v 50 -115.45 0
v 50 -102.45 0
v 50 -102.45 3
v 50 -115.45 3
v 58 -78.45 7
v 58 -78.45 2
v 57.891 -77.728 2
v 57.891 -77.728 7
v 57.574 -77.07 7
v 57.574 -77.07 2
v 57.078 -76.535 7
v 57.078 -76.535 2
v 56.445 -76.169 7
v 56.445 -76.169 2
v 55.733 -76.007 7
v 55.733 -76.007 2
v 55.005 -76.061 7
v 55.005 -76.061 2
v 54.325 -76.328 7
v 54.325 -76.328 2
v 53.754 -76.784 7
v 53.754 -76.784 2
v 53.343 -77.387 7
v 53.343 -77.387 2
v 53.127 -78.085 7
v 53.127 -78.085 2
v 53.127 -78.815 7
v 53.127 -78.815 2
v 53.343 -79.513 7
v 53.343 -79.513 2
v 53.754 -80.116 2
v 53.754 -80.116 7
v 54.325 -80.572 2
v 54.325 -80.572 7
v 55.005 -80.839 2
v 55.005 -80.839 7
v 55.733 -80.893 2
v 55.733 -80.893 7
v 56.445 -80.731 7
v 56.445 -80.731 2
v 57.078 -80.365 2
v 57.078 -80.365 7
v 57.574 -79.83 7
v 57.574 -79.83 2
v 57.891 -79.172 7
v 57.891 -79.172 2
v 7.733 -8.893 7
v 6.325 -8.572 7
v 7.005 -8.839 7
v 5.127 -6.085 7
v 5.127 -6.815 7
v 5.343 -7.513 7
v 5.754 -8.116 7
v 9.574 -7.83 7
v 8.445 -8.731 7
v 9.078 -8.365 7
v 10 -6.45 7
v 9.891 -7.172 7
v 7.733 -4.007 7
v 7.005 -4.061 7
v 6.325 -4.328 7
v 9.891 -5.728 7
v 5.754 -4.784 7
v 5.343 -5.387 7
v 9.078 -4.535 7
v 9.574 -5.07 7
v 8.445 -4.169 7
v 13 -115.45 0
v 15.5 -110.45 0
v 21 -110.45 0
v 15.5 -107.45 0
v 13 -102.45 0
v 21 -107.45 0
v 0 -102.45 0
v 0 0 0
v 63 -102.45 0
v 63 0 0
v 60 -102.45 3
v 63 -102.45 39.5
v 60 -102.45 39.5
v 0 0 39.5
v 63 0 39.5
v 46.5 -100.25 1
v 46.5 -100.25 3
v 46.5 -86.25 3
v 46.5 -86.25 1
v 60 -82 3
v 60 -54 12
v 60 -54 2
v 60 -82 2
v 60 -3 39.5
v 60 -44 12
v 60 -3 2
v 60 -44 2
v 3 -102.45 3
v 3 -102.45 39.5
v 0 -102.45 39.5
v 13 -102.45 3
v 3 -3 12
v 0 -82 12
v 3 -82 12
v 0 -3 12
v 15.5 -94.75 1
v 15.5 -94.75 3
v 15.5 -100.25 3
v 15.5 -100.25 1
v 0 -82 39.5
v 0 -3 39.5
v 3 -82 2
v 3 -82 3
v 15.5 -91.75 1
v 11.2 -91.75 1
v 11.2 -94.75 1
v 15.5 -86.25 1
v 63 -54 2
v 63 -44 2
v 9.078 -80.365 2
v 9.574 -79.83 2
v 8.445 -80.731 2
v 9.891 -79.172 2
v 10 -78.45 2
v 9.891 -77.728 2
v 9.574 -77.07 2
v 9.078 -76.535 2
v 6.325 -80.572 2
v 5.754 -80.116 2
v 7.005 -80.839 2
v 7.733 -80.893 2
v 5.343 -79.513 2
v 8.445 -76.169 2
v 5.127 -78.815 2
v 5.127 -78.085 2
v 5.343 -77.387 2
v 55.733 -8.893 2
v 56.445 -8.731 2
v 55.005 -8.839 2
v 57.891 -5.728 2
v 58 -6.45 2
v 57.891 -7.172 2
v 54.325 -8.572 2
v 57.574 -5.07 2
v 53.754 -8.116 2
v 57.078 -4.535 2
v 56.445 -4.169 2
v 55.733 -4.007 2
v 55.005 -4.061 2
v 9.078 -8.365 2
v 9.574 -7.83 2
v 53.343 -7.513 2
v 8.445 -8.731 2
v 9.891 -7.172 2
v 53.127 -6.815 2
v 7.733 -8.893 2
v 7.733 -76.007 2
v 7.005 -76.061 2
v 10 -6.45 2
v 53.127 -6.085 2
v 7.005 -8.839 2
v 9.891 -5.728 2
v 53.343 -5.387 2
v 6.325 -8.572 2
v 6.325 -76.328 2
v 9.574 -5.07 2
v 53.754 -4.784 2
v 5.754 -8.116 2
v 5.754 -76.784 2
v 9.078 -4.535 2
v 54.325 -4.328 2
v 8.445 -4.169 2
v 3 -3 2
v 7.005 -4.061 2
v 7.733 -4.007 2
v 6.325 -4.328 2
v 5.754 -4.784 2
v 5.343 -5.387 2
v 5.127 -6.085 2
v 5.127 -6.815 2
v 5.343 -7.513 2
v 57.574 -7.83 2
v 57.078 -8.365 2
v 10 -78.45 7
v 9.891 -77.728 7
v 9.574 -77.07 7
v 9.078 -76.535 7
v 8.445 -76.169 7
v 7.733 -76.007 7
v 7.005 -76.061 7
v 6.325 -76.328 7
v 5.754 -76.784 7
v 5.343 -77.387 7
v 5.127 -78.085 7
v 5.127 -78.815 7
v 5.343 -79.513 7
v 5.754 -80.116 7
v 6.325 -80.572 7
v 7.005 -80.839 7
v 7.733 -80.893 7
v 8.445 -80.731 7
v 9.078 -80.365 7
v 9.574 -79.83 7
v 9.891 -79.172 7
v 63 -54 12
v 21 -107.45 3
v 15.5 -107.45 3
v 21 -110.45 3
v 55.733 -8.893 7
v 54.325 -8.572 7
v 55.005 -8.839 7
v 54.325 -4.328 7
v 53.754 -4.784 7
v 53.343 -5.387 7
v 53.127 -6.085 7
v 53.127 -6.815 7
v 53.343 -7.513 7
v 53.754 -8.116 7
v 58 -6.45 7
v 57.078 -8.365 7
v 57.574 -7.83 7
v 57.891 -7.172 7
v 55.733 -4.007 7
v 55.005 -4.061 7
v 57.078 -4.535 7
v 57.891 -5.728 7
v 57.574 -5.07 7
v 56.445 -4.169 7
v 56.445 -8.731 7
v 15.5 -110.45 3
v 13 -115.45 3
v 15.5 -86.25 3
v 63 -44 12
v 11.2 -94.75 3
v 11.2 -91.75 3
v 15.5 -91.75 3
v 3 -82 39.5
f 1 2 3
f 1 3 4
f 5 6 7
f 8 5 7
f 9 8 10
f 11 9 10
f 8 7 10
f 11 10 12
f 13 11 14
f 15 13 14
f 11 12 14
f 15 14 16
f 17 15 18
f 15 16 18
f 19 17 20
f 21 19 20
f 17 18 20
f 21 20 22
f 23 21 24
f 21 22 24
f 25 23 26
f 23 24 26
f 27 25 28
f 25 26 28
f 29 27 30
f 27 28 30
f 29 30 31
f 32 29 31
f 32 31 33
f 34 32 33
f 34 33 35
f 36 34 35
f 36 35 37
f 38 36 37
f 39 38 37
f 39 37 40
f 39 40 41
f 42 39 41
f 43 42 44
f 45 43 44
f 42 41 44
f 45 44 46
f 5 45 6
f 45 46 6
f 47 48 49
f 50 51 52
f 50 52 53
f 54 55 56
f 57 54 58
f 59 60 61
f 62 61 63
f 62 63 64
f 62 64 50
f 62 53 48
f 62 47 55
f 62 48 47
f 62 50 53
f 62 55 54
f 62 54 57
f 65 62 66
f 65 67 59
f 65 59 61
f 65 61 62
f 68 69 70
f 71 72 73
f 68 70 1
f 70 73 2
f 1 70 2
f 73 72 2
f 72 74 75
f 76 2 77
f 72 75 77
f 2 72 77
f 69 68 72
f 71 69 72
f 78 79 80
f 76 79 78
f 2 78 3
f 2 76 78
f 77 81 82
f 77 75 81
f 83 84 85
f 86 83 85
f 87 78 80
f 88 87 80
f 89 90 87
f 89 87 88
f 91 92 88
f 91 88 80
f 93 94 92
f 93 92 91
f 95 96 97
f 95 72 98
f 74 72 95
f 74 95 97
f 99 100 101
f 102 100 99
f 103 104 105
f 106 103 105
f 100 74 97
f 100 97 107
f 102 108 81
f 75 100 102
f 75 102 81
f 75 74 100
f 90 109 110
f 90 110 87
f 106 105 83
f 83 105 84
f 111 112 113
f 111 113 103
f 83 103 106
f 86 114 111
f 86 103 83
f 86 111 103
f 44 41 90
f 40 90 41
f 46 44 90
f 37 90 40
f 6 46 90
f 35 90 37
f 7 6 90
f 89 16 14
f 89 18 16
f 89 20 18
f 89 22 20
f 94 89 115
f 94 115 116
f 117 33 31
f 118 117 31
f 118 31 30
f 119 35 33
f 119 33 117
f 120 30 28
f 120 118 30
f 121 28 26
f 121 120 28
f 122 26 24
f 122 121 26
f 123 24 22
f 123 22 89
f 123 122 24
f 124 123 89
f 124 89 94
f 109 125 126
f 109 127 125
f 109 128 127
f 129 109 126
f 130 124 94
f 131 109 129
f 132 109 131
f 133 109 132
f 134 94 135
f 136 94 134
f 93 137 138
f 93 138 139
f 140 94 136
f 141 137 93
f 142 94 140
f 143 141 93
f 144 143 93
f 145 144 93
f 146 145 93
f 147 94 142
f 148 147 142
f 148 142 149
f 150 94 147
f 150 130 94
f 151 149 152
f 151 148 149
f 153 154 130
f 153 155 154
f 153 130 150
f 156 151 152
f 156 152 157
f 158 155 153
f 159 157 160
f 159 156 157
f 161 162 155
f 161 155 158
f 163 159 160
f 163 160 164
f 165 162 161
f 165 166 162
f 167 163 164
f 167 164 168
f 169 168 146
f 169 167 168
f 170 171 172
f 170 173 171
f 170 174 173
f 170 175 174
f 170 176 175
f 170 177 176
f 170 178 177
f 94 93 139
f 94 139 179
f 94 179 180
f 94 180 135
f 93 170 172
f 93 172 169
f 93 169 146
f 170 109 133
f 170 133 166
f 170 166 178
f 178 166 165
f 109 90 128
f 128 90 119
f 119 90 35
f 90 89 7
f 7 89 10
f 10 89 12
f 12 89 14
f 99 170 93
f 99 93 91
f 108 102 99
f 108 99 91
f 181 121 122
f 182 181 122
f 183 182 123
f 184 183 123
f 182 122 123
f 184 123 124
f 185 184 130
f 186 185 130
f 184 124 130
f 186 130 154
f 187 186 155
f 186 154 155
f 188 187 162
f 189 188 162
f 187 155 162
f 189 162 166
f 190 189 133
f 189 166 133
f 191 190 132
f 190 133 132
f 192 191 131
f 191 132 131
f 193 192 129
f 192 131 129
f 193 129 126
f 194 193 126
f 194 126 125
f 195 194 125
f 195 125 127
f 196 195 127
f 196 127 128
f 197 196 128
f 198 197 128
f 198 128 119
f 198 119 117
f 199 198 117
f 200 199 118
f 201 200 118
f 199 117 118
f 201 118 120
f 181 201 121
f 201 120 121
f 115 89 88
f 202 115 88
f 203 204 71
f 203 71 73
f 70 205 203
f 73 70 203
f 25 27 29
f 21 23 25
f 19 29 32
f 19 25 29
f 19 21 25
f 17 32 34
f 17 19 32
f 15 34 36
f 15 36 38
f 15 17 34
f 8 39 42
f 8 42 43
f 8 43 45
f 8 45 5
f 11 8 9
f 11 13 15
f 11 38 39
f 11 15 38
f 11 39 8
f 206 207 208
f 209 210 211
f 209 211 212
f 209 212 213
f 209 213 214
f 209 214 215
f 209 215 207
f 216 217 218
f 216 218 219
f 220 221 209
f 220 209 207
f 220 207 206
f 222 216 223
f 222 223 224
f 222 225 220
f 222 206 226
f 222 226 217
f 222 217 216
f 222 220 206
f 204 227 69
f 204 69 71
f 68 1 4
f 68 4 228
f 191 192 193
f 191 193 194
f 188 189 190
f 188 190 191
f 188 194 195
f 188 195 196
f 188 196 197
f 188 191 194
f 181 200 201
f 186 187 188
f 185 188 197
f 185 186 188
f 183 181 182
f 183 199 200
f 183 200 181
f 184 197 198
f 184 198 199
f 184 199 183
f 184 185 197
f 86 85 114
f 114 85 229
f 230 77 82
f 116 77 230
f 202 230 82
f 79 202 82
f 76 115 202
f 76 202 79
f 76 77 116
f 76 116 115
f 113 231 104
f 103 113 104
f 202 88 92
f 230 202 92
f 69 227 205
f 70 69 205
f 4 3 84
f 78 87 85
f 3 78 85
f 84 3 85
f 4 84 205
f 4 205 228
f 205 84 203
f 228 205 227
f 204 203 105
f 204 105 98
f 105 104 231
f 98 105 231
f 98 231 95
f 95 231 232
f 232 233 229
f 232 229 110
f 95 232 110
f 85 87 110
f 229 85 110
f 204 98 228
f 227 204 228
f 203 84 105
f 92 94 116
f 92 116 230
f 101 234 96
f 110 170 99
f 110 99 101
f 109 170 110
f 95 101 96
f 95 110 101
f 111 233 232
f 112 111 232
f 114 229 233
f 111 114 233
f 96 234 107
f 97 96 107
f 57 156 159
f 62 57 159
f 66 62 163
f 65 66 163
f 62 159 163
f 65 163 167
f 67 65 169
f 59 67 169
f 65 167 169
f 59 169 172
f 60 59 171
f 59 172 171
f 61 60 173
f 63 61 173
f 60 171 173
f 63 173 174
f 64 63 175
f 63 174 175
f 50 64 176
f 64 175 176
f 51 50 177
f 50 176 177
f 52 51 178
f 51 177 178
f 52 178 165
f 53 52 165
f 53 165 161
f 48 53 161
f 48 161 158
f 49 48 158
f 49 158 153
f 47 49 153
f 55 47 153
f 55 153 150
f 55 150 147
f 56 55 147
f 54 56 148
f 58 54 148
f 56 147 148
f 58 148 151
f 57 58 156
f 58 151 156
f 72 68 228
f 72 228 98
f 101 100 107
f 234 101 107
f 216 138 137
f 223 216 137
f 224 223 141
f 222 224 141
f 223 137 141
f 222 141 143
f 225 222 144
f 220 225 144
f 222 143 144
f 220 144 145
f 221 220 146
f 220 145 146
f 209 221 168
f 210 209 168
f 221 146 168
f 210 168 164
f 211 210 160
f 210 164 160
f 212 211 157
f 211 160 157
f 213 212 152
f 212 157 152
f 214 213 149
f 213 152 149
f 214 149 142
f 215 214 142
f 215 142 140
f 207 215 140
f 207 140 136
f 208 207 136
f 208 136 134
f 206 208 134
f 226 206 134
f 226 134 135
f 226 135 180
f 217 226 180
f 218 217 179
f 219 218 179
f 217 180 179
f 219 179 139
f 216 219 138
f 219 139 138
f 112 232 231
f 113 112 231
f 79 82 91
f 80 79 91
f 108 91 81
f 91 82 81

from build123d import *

# Parameters (mm, degrees)
P_IDAT_VYSUNUT_M1_DEPTH  = 2
SKICA3_R                 = 2.45
P_IDAT_VYSUNUT_M3_DEPTH  = 5
P_IDAT_VYSUNUT_M4_DEPTH  = 37.5
SKICA8_W                 = 10
SKICA8_H                 = 10
ODEBRAT_VYSUNUT_M2_DEPTH = 136.974087605
SKICA10_W                = 27.5
SKICA10_H                = 79
ODEBRAT_VYSUNUT_M3_DEPTH = 3
P_IDAT_VYSUNUT_M5_DEPTH  = 1
ODEBRAT_VYSUNUT_M4_DEPTH = 2
SKICA12_3_W              = 5.5
SKICA12_3_H              = 3
ODEBRAT_VYSUNUT_M5_DEPTH = 137.49158399


with BuildPart() as part:
    # Skica1 → Přidat vysunutím1 (new body)
    with BuildSketch(Plane.XY):
        Polygon((13, -102.45), (13, -115.45), (50, -115.45), (50, -102.45), (63, -102.45), (63, 0), (0, 0), (0, -102.45), align=None)
    extrude(amount=P_IDAT_VYSUNUT_M1_DEPTH)

    # Skica3 → Přidat vysunutím3 (add)
    with BuildSketch(Plane.XY.offset(2)):
        with Locations((7.55, -6.45)):
            Circle(SKICA3_R)
        with Locations((7.55, -78.45)):
            Circle(SKICA3_R)
        with Locations((55.55, -78.45)):
            Circle(SKICA3_R)
        with Locations((55.55, -6.45)):
            Circle(SKICA3_R)
    extrude(amount=P_IDAT_VYSUNUT_M3_DEPTH)

    # Skica4 → Přidat vysunutím4 (add)
    with BuildSketch(Plane.XY.offset(2)):
        Polygon((63, 0), (63, -102.45), (60, -102.45), (60, -3), (3, -3), (3, -102.45), (0, -102.45), (0, 0), align=None)
    extrude(amount=P_IDAT_VYSUNUT_M4_DEPTH)

    # Skica8 → Odebrat vysunutím2 (cut, through all)
    with BuildSketch(Plane.ZY.offset(-60)):
        with Locations((7, -49)):
            Rectangle(SKICA8_W, SKICA8_H)
    extrude(amount=-ODEBRAT_VYSUNUT_M2_DEPTH, mode=Mode.SUBTRACT)

    # Skica10 → Odebrat vysunutím3 (cut)
    with BuildSketch(Plane.ZY):
        with Locations((25.75, -42.5)):
            Rectangle(SKICA10_W, SKICA10_H)
    extrude(amount=-ODEBRAT_VYSUNUT_M3_DEPTH, mode=Mode.SUBTRACT)

    # Skica11 → Přidat vysunutím5 (add)
    with BuildSketch(Plane.XY.offset(2)):
        Polygon((3, -82), (60, -82), (60, -102.45), (50, -102.45), (50, -115.45), (13, -115.45), (13, -102.45), (3, -102.45), align=None)
    extrude(amount=P_IDAT_VYSUNUT_M5_DEPTH)

    # Skica12 → Odebrat vysunutím4 (cut)
    with BuildSketch(Plane.XY.offset(3)):
        Polygon((15.5, -86.25), (15.5, -91.75), (11.2, -91.75), (11.2, -94.75), (15.5, -94.75), (15.5, -100.25), (46.5, -100.25), (46.5, -86.25), align=None)
    extrude(amount=-ODEBRAT_VYSUNUT_M4_DEPTH, mode=Mode.SUBTRACT)

    # Skica12<3> → Odebrat vysunutím5 (cut, through all)
    with BuildSketch(Plane.XY.offset(3)):
        with Locations((18.25, -108.95)):
            Rectangle(SKICA12_3_W, SKICA12_3_H)
    extrude(amount=-ODEBRAT_VYSUNUT_M5_DEPTH, mode=Mode.SUBTRACT)


solid = part.part
